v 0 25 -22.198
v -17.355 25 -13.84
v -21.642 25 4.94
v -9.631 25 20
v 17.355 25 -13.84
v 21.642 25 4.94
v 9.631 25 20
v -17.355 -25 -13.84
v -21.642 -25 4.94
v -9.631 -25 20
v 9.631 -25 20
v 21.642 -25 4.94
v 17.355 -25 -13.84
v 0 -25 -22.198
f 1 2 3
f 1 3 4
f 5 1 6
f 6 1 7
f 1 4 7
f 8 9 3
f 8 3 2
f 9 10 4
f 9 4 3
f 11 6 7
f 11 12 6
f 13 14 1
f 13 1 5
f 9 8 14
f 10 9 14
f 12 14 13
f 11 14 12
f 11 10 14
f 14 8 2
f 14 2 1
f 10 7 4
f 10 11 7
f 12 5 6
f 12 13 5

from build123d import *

# Parameters (mm, degrees)
F0_R     = 2.5
F1_DEPTH = 25


with BuildPart() as f1:
    # F0 (on Front) → F1 (new body, symmetric)
    with BuildSketch(Plane.XZ):
        Polygon((9.631492, 20), (-9.631492, 20), (-21.641767, 4.939592), (-17.35535, -13.840429), (0, -22.198325), (17.35535, -13.840429), (21.641767, 4.939592), align=None)
        Circle(F0_R, mode=Mode.SUBTRACT)
        Circle(F0_R)
    extrude(amount=F1_DEPTH, both=True)


solid = f1.part
